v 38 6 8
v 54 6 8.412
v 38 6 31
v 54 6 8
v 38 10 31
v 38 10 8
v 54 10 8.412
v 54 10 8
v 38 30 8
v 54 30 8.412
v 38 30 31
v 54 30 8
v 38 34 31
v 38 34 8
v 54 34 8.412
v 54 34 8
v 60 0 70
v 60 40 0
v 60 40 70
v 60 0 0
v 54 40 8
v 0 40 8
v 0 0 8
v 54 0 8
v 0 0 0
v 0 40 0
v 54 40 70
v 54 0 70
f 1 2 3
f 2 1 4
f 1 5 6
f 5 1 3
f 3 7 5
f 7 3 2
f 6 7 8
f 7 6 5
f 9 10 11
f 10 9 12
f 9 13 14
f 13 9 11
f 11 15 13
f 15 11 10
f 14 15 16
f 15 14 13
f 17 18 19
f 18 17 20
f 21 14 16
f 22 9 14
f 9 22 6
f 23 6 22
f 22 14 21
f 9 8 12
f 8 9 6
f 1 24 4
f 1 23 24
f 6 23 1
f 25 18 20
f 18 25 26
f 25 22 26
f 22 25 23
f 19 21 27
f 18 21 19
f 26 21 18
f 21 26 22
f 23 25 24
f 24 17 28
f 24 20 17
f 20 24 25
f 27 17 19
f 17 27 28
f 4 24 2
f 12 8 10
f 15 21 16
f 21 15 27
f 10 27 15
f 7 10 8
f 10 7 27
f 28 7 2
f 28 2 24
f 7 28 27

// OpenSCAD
$fn = 32;

// ----------------------------------------------------------------------
// Rib bracket: 2-gusset L bracket
// ----------------------------------------------------------------------

// --- parameters (mm) ---
base_l = 60;              // foot length, X
base_w = 40;              // foot width, Y
base_t = 8;               // foot thickness
plate_t = 6;              // upright plate thickness
plate_h = 70;             // overall height
gus_l = 16;               // gusset leg along the foot
gus_h = 24;               // gusset height
gus_t = 4;                // gusset thickness
gus_edge = 6;             // gusset margin from the foot edge
n_gus = 2;                // gusset count

gus_pitch = (base_w - 2 * gus_edge - gus_t) / (n_gus - 1);  // gusset pitch

union() {
  cube([base_l, base_w, base_t]);
  translate([base_l - plate_t, 0, base_t - 1])
    cube([plate_t, base_w, plate_h - base_t + 1]);
  for (i = [0 : n_gus - 1])
    translate([base_l - plate_t - gus_l, gus_edge + i * gus_pitch, base_t - 1])
      rotate([-90, 0, 0])
        linear_extrude(height = gus_t)
          polygon(points = [[0, 0], [gus_l + 1, 0], [0, -gus_h]]);
}
